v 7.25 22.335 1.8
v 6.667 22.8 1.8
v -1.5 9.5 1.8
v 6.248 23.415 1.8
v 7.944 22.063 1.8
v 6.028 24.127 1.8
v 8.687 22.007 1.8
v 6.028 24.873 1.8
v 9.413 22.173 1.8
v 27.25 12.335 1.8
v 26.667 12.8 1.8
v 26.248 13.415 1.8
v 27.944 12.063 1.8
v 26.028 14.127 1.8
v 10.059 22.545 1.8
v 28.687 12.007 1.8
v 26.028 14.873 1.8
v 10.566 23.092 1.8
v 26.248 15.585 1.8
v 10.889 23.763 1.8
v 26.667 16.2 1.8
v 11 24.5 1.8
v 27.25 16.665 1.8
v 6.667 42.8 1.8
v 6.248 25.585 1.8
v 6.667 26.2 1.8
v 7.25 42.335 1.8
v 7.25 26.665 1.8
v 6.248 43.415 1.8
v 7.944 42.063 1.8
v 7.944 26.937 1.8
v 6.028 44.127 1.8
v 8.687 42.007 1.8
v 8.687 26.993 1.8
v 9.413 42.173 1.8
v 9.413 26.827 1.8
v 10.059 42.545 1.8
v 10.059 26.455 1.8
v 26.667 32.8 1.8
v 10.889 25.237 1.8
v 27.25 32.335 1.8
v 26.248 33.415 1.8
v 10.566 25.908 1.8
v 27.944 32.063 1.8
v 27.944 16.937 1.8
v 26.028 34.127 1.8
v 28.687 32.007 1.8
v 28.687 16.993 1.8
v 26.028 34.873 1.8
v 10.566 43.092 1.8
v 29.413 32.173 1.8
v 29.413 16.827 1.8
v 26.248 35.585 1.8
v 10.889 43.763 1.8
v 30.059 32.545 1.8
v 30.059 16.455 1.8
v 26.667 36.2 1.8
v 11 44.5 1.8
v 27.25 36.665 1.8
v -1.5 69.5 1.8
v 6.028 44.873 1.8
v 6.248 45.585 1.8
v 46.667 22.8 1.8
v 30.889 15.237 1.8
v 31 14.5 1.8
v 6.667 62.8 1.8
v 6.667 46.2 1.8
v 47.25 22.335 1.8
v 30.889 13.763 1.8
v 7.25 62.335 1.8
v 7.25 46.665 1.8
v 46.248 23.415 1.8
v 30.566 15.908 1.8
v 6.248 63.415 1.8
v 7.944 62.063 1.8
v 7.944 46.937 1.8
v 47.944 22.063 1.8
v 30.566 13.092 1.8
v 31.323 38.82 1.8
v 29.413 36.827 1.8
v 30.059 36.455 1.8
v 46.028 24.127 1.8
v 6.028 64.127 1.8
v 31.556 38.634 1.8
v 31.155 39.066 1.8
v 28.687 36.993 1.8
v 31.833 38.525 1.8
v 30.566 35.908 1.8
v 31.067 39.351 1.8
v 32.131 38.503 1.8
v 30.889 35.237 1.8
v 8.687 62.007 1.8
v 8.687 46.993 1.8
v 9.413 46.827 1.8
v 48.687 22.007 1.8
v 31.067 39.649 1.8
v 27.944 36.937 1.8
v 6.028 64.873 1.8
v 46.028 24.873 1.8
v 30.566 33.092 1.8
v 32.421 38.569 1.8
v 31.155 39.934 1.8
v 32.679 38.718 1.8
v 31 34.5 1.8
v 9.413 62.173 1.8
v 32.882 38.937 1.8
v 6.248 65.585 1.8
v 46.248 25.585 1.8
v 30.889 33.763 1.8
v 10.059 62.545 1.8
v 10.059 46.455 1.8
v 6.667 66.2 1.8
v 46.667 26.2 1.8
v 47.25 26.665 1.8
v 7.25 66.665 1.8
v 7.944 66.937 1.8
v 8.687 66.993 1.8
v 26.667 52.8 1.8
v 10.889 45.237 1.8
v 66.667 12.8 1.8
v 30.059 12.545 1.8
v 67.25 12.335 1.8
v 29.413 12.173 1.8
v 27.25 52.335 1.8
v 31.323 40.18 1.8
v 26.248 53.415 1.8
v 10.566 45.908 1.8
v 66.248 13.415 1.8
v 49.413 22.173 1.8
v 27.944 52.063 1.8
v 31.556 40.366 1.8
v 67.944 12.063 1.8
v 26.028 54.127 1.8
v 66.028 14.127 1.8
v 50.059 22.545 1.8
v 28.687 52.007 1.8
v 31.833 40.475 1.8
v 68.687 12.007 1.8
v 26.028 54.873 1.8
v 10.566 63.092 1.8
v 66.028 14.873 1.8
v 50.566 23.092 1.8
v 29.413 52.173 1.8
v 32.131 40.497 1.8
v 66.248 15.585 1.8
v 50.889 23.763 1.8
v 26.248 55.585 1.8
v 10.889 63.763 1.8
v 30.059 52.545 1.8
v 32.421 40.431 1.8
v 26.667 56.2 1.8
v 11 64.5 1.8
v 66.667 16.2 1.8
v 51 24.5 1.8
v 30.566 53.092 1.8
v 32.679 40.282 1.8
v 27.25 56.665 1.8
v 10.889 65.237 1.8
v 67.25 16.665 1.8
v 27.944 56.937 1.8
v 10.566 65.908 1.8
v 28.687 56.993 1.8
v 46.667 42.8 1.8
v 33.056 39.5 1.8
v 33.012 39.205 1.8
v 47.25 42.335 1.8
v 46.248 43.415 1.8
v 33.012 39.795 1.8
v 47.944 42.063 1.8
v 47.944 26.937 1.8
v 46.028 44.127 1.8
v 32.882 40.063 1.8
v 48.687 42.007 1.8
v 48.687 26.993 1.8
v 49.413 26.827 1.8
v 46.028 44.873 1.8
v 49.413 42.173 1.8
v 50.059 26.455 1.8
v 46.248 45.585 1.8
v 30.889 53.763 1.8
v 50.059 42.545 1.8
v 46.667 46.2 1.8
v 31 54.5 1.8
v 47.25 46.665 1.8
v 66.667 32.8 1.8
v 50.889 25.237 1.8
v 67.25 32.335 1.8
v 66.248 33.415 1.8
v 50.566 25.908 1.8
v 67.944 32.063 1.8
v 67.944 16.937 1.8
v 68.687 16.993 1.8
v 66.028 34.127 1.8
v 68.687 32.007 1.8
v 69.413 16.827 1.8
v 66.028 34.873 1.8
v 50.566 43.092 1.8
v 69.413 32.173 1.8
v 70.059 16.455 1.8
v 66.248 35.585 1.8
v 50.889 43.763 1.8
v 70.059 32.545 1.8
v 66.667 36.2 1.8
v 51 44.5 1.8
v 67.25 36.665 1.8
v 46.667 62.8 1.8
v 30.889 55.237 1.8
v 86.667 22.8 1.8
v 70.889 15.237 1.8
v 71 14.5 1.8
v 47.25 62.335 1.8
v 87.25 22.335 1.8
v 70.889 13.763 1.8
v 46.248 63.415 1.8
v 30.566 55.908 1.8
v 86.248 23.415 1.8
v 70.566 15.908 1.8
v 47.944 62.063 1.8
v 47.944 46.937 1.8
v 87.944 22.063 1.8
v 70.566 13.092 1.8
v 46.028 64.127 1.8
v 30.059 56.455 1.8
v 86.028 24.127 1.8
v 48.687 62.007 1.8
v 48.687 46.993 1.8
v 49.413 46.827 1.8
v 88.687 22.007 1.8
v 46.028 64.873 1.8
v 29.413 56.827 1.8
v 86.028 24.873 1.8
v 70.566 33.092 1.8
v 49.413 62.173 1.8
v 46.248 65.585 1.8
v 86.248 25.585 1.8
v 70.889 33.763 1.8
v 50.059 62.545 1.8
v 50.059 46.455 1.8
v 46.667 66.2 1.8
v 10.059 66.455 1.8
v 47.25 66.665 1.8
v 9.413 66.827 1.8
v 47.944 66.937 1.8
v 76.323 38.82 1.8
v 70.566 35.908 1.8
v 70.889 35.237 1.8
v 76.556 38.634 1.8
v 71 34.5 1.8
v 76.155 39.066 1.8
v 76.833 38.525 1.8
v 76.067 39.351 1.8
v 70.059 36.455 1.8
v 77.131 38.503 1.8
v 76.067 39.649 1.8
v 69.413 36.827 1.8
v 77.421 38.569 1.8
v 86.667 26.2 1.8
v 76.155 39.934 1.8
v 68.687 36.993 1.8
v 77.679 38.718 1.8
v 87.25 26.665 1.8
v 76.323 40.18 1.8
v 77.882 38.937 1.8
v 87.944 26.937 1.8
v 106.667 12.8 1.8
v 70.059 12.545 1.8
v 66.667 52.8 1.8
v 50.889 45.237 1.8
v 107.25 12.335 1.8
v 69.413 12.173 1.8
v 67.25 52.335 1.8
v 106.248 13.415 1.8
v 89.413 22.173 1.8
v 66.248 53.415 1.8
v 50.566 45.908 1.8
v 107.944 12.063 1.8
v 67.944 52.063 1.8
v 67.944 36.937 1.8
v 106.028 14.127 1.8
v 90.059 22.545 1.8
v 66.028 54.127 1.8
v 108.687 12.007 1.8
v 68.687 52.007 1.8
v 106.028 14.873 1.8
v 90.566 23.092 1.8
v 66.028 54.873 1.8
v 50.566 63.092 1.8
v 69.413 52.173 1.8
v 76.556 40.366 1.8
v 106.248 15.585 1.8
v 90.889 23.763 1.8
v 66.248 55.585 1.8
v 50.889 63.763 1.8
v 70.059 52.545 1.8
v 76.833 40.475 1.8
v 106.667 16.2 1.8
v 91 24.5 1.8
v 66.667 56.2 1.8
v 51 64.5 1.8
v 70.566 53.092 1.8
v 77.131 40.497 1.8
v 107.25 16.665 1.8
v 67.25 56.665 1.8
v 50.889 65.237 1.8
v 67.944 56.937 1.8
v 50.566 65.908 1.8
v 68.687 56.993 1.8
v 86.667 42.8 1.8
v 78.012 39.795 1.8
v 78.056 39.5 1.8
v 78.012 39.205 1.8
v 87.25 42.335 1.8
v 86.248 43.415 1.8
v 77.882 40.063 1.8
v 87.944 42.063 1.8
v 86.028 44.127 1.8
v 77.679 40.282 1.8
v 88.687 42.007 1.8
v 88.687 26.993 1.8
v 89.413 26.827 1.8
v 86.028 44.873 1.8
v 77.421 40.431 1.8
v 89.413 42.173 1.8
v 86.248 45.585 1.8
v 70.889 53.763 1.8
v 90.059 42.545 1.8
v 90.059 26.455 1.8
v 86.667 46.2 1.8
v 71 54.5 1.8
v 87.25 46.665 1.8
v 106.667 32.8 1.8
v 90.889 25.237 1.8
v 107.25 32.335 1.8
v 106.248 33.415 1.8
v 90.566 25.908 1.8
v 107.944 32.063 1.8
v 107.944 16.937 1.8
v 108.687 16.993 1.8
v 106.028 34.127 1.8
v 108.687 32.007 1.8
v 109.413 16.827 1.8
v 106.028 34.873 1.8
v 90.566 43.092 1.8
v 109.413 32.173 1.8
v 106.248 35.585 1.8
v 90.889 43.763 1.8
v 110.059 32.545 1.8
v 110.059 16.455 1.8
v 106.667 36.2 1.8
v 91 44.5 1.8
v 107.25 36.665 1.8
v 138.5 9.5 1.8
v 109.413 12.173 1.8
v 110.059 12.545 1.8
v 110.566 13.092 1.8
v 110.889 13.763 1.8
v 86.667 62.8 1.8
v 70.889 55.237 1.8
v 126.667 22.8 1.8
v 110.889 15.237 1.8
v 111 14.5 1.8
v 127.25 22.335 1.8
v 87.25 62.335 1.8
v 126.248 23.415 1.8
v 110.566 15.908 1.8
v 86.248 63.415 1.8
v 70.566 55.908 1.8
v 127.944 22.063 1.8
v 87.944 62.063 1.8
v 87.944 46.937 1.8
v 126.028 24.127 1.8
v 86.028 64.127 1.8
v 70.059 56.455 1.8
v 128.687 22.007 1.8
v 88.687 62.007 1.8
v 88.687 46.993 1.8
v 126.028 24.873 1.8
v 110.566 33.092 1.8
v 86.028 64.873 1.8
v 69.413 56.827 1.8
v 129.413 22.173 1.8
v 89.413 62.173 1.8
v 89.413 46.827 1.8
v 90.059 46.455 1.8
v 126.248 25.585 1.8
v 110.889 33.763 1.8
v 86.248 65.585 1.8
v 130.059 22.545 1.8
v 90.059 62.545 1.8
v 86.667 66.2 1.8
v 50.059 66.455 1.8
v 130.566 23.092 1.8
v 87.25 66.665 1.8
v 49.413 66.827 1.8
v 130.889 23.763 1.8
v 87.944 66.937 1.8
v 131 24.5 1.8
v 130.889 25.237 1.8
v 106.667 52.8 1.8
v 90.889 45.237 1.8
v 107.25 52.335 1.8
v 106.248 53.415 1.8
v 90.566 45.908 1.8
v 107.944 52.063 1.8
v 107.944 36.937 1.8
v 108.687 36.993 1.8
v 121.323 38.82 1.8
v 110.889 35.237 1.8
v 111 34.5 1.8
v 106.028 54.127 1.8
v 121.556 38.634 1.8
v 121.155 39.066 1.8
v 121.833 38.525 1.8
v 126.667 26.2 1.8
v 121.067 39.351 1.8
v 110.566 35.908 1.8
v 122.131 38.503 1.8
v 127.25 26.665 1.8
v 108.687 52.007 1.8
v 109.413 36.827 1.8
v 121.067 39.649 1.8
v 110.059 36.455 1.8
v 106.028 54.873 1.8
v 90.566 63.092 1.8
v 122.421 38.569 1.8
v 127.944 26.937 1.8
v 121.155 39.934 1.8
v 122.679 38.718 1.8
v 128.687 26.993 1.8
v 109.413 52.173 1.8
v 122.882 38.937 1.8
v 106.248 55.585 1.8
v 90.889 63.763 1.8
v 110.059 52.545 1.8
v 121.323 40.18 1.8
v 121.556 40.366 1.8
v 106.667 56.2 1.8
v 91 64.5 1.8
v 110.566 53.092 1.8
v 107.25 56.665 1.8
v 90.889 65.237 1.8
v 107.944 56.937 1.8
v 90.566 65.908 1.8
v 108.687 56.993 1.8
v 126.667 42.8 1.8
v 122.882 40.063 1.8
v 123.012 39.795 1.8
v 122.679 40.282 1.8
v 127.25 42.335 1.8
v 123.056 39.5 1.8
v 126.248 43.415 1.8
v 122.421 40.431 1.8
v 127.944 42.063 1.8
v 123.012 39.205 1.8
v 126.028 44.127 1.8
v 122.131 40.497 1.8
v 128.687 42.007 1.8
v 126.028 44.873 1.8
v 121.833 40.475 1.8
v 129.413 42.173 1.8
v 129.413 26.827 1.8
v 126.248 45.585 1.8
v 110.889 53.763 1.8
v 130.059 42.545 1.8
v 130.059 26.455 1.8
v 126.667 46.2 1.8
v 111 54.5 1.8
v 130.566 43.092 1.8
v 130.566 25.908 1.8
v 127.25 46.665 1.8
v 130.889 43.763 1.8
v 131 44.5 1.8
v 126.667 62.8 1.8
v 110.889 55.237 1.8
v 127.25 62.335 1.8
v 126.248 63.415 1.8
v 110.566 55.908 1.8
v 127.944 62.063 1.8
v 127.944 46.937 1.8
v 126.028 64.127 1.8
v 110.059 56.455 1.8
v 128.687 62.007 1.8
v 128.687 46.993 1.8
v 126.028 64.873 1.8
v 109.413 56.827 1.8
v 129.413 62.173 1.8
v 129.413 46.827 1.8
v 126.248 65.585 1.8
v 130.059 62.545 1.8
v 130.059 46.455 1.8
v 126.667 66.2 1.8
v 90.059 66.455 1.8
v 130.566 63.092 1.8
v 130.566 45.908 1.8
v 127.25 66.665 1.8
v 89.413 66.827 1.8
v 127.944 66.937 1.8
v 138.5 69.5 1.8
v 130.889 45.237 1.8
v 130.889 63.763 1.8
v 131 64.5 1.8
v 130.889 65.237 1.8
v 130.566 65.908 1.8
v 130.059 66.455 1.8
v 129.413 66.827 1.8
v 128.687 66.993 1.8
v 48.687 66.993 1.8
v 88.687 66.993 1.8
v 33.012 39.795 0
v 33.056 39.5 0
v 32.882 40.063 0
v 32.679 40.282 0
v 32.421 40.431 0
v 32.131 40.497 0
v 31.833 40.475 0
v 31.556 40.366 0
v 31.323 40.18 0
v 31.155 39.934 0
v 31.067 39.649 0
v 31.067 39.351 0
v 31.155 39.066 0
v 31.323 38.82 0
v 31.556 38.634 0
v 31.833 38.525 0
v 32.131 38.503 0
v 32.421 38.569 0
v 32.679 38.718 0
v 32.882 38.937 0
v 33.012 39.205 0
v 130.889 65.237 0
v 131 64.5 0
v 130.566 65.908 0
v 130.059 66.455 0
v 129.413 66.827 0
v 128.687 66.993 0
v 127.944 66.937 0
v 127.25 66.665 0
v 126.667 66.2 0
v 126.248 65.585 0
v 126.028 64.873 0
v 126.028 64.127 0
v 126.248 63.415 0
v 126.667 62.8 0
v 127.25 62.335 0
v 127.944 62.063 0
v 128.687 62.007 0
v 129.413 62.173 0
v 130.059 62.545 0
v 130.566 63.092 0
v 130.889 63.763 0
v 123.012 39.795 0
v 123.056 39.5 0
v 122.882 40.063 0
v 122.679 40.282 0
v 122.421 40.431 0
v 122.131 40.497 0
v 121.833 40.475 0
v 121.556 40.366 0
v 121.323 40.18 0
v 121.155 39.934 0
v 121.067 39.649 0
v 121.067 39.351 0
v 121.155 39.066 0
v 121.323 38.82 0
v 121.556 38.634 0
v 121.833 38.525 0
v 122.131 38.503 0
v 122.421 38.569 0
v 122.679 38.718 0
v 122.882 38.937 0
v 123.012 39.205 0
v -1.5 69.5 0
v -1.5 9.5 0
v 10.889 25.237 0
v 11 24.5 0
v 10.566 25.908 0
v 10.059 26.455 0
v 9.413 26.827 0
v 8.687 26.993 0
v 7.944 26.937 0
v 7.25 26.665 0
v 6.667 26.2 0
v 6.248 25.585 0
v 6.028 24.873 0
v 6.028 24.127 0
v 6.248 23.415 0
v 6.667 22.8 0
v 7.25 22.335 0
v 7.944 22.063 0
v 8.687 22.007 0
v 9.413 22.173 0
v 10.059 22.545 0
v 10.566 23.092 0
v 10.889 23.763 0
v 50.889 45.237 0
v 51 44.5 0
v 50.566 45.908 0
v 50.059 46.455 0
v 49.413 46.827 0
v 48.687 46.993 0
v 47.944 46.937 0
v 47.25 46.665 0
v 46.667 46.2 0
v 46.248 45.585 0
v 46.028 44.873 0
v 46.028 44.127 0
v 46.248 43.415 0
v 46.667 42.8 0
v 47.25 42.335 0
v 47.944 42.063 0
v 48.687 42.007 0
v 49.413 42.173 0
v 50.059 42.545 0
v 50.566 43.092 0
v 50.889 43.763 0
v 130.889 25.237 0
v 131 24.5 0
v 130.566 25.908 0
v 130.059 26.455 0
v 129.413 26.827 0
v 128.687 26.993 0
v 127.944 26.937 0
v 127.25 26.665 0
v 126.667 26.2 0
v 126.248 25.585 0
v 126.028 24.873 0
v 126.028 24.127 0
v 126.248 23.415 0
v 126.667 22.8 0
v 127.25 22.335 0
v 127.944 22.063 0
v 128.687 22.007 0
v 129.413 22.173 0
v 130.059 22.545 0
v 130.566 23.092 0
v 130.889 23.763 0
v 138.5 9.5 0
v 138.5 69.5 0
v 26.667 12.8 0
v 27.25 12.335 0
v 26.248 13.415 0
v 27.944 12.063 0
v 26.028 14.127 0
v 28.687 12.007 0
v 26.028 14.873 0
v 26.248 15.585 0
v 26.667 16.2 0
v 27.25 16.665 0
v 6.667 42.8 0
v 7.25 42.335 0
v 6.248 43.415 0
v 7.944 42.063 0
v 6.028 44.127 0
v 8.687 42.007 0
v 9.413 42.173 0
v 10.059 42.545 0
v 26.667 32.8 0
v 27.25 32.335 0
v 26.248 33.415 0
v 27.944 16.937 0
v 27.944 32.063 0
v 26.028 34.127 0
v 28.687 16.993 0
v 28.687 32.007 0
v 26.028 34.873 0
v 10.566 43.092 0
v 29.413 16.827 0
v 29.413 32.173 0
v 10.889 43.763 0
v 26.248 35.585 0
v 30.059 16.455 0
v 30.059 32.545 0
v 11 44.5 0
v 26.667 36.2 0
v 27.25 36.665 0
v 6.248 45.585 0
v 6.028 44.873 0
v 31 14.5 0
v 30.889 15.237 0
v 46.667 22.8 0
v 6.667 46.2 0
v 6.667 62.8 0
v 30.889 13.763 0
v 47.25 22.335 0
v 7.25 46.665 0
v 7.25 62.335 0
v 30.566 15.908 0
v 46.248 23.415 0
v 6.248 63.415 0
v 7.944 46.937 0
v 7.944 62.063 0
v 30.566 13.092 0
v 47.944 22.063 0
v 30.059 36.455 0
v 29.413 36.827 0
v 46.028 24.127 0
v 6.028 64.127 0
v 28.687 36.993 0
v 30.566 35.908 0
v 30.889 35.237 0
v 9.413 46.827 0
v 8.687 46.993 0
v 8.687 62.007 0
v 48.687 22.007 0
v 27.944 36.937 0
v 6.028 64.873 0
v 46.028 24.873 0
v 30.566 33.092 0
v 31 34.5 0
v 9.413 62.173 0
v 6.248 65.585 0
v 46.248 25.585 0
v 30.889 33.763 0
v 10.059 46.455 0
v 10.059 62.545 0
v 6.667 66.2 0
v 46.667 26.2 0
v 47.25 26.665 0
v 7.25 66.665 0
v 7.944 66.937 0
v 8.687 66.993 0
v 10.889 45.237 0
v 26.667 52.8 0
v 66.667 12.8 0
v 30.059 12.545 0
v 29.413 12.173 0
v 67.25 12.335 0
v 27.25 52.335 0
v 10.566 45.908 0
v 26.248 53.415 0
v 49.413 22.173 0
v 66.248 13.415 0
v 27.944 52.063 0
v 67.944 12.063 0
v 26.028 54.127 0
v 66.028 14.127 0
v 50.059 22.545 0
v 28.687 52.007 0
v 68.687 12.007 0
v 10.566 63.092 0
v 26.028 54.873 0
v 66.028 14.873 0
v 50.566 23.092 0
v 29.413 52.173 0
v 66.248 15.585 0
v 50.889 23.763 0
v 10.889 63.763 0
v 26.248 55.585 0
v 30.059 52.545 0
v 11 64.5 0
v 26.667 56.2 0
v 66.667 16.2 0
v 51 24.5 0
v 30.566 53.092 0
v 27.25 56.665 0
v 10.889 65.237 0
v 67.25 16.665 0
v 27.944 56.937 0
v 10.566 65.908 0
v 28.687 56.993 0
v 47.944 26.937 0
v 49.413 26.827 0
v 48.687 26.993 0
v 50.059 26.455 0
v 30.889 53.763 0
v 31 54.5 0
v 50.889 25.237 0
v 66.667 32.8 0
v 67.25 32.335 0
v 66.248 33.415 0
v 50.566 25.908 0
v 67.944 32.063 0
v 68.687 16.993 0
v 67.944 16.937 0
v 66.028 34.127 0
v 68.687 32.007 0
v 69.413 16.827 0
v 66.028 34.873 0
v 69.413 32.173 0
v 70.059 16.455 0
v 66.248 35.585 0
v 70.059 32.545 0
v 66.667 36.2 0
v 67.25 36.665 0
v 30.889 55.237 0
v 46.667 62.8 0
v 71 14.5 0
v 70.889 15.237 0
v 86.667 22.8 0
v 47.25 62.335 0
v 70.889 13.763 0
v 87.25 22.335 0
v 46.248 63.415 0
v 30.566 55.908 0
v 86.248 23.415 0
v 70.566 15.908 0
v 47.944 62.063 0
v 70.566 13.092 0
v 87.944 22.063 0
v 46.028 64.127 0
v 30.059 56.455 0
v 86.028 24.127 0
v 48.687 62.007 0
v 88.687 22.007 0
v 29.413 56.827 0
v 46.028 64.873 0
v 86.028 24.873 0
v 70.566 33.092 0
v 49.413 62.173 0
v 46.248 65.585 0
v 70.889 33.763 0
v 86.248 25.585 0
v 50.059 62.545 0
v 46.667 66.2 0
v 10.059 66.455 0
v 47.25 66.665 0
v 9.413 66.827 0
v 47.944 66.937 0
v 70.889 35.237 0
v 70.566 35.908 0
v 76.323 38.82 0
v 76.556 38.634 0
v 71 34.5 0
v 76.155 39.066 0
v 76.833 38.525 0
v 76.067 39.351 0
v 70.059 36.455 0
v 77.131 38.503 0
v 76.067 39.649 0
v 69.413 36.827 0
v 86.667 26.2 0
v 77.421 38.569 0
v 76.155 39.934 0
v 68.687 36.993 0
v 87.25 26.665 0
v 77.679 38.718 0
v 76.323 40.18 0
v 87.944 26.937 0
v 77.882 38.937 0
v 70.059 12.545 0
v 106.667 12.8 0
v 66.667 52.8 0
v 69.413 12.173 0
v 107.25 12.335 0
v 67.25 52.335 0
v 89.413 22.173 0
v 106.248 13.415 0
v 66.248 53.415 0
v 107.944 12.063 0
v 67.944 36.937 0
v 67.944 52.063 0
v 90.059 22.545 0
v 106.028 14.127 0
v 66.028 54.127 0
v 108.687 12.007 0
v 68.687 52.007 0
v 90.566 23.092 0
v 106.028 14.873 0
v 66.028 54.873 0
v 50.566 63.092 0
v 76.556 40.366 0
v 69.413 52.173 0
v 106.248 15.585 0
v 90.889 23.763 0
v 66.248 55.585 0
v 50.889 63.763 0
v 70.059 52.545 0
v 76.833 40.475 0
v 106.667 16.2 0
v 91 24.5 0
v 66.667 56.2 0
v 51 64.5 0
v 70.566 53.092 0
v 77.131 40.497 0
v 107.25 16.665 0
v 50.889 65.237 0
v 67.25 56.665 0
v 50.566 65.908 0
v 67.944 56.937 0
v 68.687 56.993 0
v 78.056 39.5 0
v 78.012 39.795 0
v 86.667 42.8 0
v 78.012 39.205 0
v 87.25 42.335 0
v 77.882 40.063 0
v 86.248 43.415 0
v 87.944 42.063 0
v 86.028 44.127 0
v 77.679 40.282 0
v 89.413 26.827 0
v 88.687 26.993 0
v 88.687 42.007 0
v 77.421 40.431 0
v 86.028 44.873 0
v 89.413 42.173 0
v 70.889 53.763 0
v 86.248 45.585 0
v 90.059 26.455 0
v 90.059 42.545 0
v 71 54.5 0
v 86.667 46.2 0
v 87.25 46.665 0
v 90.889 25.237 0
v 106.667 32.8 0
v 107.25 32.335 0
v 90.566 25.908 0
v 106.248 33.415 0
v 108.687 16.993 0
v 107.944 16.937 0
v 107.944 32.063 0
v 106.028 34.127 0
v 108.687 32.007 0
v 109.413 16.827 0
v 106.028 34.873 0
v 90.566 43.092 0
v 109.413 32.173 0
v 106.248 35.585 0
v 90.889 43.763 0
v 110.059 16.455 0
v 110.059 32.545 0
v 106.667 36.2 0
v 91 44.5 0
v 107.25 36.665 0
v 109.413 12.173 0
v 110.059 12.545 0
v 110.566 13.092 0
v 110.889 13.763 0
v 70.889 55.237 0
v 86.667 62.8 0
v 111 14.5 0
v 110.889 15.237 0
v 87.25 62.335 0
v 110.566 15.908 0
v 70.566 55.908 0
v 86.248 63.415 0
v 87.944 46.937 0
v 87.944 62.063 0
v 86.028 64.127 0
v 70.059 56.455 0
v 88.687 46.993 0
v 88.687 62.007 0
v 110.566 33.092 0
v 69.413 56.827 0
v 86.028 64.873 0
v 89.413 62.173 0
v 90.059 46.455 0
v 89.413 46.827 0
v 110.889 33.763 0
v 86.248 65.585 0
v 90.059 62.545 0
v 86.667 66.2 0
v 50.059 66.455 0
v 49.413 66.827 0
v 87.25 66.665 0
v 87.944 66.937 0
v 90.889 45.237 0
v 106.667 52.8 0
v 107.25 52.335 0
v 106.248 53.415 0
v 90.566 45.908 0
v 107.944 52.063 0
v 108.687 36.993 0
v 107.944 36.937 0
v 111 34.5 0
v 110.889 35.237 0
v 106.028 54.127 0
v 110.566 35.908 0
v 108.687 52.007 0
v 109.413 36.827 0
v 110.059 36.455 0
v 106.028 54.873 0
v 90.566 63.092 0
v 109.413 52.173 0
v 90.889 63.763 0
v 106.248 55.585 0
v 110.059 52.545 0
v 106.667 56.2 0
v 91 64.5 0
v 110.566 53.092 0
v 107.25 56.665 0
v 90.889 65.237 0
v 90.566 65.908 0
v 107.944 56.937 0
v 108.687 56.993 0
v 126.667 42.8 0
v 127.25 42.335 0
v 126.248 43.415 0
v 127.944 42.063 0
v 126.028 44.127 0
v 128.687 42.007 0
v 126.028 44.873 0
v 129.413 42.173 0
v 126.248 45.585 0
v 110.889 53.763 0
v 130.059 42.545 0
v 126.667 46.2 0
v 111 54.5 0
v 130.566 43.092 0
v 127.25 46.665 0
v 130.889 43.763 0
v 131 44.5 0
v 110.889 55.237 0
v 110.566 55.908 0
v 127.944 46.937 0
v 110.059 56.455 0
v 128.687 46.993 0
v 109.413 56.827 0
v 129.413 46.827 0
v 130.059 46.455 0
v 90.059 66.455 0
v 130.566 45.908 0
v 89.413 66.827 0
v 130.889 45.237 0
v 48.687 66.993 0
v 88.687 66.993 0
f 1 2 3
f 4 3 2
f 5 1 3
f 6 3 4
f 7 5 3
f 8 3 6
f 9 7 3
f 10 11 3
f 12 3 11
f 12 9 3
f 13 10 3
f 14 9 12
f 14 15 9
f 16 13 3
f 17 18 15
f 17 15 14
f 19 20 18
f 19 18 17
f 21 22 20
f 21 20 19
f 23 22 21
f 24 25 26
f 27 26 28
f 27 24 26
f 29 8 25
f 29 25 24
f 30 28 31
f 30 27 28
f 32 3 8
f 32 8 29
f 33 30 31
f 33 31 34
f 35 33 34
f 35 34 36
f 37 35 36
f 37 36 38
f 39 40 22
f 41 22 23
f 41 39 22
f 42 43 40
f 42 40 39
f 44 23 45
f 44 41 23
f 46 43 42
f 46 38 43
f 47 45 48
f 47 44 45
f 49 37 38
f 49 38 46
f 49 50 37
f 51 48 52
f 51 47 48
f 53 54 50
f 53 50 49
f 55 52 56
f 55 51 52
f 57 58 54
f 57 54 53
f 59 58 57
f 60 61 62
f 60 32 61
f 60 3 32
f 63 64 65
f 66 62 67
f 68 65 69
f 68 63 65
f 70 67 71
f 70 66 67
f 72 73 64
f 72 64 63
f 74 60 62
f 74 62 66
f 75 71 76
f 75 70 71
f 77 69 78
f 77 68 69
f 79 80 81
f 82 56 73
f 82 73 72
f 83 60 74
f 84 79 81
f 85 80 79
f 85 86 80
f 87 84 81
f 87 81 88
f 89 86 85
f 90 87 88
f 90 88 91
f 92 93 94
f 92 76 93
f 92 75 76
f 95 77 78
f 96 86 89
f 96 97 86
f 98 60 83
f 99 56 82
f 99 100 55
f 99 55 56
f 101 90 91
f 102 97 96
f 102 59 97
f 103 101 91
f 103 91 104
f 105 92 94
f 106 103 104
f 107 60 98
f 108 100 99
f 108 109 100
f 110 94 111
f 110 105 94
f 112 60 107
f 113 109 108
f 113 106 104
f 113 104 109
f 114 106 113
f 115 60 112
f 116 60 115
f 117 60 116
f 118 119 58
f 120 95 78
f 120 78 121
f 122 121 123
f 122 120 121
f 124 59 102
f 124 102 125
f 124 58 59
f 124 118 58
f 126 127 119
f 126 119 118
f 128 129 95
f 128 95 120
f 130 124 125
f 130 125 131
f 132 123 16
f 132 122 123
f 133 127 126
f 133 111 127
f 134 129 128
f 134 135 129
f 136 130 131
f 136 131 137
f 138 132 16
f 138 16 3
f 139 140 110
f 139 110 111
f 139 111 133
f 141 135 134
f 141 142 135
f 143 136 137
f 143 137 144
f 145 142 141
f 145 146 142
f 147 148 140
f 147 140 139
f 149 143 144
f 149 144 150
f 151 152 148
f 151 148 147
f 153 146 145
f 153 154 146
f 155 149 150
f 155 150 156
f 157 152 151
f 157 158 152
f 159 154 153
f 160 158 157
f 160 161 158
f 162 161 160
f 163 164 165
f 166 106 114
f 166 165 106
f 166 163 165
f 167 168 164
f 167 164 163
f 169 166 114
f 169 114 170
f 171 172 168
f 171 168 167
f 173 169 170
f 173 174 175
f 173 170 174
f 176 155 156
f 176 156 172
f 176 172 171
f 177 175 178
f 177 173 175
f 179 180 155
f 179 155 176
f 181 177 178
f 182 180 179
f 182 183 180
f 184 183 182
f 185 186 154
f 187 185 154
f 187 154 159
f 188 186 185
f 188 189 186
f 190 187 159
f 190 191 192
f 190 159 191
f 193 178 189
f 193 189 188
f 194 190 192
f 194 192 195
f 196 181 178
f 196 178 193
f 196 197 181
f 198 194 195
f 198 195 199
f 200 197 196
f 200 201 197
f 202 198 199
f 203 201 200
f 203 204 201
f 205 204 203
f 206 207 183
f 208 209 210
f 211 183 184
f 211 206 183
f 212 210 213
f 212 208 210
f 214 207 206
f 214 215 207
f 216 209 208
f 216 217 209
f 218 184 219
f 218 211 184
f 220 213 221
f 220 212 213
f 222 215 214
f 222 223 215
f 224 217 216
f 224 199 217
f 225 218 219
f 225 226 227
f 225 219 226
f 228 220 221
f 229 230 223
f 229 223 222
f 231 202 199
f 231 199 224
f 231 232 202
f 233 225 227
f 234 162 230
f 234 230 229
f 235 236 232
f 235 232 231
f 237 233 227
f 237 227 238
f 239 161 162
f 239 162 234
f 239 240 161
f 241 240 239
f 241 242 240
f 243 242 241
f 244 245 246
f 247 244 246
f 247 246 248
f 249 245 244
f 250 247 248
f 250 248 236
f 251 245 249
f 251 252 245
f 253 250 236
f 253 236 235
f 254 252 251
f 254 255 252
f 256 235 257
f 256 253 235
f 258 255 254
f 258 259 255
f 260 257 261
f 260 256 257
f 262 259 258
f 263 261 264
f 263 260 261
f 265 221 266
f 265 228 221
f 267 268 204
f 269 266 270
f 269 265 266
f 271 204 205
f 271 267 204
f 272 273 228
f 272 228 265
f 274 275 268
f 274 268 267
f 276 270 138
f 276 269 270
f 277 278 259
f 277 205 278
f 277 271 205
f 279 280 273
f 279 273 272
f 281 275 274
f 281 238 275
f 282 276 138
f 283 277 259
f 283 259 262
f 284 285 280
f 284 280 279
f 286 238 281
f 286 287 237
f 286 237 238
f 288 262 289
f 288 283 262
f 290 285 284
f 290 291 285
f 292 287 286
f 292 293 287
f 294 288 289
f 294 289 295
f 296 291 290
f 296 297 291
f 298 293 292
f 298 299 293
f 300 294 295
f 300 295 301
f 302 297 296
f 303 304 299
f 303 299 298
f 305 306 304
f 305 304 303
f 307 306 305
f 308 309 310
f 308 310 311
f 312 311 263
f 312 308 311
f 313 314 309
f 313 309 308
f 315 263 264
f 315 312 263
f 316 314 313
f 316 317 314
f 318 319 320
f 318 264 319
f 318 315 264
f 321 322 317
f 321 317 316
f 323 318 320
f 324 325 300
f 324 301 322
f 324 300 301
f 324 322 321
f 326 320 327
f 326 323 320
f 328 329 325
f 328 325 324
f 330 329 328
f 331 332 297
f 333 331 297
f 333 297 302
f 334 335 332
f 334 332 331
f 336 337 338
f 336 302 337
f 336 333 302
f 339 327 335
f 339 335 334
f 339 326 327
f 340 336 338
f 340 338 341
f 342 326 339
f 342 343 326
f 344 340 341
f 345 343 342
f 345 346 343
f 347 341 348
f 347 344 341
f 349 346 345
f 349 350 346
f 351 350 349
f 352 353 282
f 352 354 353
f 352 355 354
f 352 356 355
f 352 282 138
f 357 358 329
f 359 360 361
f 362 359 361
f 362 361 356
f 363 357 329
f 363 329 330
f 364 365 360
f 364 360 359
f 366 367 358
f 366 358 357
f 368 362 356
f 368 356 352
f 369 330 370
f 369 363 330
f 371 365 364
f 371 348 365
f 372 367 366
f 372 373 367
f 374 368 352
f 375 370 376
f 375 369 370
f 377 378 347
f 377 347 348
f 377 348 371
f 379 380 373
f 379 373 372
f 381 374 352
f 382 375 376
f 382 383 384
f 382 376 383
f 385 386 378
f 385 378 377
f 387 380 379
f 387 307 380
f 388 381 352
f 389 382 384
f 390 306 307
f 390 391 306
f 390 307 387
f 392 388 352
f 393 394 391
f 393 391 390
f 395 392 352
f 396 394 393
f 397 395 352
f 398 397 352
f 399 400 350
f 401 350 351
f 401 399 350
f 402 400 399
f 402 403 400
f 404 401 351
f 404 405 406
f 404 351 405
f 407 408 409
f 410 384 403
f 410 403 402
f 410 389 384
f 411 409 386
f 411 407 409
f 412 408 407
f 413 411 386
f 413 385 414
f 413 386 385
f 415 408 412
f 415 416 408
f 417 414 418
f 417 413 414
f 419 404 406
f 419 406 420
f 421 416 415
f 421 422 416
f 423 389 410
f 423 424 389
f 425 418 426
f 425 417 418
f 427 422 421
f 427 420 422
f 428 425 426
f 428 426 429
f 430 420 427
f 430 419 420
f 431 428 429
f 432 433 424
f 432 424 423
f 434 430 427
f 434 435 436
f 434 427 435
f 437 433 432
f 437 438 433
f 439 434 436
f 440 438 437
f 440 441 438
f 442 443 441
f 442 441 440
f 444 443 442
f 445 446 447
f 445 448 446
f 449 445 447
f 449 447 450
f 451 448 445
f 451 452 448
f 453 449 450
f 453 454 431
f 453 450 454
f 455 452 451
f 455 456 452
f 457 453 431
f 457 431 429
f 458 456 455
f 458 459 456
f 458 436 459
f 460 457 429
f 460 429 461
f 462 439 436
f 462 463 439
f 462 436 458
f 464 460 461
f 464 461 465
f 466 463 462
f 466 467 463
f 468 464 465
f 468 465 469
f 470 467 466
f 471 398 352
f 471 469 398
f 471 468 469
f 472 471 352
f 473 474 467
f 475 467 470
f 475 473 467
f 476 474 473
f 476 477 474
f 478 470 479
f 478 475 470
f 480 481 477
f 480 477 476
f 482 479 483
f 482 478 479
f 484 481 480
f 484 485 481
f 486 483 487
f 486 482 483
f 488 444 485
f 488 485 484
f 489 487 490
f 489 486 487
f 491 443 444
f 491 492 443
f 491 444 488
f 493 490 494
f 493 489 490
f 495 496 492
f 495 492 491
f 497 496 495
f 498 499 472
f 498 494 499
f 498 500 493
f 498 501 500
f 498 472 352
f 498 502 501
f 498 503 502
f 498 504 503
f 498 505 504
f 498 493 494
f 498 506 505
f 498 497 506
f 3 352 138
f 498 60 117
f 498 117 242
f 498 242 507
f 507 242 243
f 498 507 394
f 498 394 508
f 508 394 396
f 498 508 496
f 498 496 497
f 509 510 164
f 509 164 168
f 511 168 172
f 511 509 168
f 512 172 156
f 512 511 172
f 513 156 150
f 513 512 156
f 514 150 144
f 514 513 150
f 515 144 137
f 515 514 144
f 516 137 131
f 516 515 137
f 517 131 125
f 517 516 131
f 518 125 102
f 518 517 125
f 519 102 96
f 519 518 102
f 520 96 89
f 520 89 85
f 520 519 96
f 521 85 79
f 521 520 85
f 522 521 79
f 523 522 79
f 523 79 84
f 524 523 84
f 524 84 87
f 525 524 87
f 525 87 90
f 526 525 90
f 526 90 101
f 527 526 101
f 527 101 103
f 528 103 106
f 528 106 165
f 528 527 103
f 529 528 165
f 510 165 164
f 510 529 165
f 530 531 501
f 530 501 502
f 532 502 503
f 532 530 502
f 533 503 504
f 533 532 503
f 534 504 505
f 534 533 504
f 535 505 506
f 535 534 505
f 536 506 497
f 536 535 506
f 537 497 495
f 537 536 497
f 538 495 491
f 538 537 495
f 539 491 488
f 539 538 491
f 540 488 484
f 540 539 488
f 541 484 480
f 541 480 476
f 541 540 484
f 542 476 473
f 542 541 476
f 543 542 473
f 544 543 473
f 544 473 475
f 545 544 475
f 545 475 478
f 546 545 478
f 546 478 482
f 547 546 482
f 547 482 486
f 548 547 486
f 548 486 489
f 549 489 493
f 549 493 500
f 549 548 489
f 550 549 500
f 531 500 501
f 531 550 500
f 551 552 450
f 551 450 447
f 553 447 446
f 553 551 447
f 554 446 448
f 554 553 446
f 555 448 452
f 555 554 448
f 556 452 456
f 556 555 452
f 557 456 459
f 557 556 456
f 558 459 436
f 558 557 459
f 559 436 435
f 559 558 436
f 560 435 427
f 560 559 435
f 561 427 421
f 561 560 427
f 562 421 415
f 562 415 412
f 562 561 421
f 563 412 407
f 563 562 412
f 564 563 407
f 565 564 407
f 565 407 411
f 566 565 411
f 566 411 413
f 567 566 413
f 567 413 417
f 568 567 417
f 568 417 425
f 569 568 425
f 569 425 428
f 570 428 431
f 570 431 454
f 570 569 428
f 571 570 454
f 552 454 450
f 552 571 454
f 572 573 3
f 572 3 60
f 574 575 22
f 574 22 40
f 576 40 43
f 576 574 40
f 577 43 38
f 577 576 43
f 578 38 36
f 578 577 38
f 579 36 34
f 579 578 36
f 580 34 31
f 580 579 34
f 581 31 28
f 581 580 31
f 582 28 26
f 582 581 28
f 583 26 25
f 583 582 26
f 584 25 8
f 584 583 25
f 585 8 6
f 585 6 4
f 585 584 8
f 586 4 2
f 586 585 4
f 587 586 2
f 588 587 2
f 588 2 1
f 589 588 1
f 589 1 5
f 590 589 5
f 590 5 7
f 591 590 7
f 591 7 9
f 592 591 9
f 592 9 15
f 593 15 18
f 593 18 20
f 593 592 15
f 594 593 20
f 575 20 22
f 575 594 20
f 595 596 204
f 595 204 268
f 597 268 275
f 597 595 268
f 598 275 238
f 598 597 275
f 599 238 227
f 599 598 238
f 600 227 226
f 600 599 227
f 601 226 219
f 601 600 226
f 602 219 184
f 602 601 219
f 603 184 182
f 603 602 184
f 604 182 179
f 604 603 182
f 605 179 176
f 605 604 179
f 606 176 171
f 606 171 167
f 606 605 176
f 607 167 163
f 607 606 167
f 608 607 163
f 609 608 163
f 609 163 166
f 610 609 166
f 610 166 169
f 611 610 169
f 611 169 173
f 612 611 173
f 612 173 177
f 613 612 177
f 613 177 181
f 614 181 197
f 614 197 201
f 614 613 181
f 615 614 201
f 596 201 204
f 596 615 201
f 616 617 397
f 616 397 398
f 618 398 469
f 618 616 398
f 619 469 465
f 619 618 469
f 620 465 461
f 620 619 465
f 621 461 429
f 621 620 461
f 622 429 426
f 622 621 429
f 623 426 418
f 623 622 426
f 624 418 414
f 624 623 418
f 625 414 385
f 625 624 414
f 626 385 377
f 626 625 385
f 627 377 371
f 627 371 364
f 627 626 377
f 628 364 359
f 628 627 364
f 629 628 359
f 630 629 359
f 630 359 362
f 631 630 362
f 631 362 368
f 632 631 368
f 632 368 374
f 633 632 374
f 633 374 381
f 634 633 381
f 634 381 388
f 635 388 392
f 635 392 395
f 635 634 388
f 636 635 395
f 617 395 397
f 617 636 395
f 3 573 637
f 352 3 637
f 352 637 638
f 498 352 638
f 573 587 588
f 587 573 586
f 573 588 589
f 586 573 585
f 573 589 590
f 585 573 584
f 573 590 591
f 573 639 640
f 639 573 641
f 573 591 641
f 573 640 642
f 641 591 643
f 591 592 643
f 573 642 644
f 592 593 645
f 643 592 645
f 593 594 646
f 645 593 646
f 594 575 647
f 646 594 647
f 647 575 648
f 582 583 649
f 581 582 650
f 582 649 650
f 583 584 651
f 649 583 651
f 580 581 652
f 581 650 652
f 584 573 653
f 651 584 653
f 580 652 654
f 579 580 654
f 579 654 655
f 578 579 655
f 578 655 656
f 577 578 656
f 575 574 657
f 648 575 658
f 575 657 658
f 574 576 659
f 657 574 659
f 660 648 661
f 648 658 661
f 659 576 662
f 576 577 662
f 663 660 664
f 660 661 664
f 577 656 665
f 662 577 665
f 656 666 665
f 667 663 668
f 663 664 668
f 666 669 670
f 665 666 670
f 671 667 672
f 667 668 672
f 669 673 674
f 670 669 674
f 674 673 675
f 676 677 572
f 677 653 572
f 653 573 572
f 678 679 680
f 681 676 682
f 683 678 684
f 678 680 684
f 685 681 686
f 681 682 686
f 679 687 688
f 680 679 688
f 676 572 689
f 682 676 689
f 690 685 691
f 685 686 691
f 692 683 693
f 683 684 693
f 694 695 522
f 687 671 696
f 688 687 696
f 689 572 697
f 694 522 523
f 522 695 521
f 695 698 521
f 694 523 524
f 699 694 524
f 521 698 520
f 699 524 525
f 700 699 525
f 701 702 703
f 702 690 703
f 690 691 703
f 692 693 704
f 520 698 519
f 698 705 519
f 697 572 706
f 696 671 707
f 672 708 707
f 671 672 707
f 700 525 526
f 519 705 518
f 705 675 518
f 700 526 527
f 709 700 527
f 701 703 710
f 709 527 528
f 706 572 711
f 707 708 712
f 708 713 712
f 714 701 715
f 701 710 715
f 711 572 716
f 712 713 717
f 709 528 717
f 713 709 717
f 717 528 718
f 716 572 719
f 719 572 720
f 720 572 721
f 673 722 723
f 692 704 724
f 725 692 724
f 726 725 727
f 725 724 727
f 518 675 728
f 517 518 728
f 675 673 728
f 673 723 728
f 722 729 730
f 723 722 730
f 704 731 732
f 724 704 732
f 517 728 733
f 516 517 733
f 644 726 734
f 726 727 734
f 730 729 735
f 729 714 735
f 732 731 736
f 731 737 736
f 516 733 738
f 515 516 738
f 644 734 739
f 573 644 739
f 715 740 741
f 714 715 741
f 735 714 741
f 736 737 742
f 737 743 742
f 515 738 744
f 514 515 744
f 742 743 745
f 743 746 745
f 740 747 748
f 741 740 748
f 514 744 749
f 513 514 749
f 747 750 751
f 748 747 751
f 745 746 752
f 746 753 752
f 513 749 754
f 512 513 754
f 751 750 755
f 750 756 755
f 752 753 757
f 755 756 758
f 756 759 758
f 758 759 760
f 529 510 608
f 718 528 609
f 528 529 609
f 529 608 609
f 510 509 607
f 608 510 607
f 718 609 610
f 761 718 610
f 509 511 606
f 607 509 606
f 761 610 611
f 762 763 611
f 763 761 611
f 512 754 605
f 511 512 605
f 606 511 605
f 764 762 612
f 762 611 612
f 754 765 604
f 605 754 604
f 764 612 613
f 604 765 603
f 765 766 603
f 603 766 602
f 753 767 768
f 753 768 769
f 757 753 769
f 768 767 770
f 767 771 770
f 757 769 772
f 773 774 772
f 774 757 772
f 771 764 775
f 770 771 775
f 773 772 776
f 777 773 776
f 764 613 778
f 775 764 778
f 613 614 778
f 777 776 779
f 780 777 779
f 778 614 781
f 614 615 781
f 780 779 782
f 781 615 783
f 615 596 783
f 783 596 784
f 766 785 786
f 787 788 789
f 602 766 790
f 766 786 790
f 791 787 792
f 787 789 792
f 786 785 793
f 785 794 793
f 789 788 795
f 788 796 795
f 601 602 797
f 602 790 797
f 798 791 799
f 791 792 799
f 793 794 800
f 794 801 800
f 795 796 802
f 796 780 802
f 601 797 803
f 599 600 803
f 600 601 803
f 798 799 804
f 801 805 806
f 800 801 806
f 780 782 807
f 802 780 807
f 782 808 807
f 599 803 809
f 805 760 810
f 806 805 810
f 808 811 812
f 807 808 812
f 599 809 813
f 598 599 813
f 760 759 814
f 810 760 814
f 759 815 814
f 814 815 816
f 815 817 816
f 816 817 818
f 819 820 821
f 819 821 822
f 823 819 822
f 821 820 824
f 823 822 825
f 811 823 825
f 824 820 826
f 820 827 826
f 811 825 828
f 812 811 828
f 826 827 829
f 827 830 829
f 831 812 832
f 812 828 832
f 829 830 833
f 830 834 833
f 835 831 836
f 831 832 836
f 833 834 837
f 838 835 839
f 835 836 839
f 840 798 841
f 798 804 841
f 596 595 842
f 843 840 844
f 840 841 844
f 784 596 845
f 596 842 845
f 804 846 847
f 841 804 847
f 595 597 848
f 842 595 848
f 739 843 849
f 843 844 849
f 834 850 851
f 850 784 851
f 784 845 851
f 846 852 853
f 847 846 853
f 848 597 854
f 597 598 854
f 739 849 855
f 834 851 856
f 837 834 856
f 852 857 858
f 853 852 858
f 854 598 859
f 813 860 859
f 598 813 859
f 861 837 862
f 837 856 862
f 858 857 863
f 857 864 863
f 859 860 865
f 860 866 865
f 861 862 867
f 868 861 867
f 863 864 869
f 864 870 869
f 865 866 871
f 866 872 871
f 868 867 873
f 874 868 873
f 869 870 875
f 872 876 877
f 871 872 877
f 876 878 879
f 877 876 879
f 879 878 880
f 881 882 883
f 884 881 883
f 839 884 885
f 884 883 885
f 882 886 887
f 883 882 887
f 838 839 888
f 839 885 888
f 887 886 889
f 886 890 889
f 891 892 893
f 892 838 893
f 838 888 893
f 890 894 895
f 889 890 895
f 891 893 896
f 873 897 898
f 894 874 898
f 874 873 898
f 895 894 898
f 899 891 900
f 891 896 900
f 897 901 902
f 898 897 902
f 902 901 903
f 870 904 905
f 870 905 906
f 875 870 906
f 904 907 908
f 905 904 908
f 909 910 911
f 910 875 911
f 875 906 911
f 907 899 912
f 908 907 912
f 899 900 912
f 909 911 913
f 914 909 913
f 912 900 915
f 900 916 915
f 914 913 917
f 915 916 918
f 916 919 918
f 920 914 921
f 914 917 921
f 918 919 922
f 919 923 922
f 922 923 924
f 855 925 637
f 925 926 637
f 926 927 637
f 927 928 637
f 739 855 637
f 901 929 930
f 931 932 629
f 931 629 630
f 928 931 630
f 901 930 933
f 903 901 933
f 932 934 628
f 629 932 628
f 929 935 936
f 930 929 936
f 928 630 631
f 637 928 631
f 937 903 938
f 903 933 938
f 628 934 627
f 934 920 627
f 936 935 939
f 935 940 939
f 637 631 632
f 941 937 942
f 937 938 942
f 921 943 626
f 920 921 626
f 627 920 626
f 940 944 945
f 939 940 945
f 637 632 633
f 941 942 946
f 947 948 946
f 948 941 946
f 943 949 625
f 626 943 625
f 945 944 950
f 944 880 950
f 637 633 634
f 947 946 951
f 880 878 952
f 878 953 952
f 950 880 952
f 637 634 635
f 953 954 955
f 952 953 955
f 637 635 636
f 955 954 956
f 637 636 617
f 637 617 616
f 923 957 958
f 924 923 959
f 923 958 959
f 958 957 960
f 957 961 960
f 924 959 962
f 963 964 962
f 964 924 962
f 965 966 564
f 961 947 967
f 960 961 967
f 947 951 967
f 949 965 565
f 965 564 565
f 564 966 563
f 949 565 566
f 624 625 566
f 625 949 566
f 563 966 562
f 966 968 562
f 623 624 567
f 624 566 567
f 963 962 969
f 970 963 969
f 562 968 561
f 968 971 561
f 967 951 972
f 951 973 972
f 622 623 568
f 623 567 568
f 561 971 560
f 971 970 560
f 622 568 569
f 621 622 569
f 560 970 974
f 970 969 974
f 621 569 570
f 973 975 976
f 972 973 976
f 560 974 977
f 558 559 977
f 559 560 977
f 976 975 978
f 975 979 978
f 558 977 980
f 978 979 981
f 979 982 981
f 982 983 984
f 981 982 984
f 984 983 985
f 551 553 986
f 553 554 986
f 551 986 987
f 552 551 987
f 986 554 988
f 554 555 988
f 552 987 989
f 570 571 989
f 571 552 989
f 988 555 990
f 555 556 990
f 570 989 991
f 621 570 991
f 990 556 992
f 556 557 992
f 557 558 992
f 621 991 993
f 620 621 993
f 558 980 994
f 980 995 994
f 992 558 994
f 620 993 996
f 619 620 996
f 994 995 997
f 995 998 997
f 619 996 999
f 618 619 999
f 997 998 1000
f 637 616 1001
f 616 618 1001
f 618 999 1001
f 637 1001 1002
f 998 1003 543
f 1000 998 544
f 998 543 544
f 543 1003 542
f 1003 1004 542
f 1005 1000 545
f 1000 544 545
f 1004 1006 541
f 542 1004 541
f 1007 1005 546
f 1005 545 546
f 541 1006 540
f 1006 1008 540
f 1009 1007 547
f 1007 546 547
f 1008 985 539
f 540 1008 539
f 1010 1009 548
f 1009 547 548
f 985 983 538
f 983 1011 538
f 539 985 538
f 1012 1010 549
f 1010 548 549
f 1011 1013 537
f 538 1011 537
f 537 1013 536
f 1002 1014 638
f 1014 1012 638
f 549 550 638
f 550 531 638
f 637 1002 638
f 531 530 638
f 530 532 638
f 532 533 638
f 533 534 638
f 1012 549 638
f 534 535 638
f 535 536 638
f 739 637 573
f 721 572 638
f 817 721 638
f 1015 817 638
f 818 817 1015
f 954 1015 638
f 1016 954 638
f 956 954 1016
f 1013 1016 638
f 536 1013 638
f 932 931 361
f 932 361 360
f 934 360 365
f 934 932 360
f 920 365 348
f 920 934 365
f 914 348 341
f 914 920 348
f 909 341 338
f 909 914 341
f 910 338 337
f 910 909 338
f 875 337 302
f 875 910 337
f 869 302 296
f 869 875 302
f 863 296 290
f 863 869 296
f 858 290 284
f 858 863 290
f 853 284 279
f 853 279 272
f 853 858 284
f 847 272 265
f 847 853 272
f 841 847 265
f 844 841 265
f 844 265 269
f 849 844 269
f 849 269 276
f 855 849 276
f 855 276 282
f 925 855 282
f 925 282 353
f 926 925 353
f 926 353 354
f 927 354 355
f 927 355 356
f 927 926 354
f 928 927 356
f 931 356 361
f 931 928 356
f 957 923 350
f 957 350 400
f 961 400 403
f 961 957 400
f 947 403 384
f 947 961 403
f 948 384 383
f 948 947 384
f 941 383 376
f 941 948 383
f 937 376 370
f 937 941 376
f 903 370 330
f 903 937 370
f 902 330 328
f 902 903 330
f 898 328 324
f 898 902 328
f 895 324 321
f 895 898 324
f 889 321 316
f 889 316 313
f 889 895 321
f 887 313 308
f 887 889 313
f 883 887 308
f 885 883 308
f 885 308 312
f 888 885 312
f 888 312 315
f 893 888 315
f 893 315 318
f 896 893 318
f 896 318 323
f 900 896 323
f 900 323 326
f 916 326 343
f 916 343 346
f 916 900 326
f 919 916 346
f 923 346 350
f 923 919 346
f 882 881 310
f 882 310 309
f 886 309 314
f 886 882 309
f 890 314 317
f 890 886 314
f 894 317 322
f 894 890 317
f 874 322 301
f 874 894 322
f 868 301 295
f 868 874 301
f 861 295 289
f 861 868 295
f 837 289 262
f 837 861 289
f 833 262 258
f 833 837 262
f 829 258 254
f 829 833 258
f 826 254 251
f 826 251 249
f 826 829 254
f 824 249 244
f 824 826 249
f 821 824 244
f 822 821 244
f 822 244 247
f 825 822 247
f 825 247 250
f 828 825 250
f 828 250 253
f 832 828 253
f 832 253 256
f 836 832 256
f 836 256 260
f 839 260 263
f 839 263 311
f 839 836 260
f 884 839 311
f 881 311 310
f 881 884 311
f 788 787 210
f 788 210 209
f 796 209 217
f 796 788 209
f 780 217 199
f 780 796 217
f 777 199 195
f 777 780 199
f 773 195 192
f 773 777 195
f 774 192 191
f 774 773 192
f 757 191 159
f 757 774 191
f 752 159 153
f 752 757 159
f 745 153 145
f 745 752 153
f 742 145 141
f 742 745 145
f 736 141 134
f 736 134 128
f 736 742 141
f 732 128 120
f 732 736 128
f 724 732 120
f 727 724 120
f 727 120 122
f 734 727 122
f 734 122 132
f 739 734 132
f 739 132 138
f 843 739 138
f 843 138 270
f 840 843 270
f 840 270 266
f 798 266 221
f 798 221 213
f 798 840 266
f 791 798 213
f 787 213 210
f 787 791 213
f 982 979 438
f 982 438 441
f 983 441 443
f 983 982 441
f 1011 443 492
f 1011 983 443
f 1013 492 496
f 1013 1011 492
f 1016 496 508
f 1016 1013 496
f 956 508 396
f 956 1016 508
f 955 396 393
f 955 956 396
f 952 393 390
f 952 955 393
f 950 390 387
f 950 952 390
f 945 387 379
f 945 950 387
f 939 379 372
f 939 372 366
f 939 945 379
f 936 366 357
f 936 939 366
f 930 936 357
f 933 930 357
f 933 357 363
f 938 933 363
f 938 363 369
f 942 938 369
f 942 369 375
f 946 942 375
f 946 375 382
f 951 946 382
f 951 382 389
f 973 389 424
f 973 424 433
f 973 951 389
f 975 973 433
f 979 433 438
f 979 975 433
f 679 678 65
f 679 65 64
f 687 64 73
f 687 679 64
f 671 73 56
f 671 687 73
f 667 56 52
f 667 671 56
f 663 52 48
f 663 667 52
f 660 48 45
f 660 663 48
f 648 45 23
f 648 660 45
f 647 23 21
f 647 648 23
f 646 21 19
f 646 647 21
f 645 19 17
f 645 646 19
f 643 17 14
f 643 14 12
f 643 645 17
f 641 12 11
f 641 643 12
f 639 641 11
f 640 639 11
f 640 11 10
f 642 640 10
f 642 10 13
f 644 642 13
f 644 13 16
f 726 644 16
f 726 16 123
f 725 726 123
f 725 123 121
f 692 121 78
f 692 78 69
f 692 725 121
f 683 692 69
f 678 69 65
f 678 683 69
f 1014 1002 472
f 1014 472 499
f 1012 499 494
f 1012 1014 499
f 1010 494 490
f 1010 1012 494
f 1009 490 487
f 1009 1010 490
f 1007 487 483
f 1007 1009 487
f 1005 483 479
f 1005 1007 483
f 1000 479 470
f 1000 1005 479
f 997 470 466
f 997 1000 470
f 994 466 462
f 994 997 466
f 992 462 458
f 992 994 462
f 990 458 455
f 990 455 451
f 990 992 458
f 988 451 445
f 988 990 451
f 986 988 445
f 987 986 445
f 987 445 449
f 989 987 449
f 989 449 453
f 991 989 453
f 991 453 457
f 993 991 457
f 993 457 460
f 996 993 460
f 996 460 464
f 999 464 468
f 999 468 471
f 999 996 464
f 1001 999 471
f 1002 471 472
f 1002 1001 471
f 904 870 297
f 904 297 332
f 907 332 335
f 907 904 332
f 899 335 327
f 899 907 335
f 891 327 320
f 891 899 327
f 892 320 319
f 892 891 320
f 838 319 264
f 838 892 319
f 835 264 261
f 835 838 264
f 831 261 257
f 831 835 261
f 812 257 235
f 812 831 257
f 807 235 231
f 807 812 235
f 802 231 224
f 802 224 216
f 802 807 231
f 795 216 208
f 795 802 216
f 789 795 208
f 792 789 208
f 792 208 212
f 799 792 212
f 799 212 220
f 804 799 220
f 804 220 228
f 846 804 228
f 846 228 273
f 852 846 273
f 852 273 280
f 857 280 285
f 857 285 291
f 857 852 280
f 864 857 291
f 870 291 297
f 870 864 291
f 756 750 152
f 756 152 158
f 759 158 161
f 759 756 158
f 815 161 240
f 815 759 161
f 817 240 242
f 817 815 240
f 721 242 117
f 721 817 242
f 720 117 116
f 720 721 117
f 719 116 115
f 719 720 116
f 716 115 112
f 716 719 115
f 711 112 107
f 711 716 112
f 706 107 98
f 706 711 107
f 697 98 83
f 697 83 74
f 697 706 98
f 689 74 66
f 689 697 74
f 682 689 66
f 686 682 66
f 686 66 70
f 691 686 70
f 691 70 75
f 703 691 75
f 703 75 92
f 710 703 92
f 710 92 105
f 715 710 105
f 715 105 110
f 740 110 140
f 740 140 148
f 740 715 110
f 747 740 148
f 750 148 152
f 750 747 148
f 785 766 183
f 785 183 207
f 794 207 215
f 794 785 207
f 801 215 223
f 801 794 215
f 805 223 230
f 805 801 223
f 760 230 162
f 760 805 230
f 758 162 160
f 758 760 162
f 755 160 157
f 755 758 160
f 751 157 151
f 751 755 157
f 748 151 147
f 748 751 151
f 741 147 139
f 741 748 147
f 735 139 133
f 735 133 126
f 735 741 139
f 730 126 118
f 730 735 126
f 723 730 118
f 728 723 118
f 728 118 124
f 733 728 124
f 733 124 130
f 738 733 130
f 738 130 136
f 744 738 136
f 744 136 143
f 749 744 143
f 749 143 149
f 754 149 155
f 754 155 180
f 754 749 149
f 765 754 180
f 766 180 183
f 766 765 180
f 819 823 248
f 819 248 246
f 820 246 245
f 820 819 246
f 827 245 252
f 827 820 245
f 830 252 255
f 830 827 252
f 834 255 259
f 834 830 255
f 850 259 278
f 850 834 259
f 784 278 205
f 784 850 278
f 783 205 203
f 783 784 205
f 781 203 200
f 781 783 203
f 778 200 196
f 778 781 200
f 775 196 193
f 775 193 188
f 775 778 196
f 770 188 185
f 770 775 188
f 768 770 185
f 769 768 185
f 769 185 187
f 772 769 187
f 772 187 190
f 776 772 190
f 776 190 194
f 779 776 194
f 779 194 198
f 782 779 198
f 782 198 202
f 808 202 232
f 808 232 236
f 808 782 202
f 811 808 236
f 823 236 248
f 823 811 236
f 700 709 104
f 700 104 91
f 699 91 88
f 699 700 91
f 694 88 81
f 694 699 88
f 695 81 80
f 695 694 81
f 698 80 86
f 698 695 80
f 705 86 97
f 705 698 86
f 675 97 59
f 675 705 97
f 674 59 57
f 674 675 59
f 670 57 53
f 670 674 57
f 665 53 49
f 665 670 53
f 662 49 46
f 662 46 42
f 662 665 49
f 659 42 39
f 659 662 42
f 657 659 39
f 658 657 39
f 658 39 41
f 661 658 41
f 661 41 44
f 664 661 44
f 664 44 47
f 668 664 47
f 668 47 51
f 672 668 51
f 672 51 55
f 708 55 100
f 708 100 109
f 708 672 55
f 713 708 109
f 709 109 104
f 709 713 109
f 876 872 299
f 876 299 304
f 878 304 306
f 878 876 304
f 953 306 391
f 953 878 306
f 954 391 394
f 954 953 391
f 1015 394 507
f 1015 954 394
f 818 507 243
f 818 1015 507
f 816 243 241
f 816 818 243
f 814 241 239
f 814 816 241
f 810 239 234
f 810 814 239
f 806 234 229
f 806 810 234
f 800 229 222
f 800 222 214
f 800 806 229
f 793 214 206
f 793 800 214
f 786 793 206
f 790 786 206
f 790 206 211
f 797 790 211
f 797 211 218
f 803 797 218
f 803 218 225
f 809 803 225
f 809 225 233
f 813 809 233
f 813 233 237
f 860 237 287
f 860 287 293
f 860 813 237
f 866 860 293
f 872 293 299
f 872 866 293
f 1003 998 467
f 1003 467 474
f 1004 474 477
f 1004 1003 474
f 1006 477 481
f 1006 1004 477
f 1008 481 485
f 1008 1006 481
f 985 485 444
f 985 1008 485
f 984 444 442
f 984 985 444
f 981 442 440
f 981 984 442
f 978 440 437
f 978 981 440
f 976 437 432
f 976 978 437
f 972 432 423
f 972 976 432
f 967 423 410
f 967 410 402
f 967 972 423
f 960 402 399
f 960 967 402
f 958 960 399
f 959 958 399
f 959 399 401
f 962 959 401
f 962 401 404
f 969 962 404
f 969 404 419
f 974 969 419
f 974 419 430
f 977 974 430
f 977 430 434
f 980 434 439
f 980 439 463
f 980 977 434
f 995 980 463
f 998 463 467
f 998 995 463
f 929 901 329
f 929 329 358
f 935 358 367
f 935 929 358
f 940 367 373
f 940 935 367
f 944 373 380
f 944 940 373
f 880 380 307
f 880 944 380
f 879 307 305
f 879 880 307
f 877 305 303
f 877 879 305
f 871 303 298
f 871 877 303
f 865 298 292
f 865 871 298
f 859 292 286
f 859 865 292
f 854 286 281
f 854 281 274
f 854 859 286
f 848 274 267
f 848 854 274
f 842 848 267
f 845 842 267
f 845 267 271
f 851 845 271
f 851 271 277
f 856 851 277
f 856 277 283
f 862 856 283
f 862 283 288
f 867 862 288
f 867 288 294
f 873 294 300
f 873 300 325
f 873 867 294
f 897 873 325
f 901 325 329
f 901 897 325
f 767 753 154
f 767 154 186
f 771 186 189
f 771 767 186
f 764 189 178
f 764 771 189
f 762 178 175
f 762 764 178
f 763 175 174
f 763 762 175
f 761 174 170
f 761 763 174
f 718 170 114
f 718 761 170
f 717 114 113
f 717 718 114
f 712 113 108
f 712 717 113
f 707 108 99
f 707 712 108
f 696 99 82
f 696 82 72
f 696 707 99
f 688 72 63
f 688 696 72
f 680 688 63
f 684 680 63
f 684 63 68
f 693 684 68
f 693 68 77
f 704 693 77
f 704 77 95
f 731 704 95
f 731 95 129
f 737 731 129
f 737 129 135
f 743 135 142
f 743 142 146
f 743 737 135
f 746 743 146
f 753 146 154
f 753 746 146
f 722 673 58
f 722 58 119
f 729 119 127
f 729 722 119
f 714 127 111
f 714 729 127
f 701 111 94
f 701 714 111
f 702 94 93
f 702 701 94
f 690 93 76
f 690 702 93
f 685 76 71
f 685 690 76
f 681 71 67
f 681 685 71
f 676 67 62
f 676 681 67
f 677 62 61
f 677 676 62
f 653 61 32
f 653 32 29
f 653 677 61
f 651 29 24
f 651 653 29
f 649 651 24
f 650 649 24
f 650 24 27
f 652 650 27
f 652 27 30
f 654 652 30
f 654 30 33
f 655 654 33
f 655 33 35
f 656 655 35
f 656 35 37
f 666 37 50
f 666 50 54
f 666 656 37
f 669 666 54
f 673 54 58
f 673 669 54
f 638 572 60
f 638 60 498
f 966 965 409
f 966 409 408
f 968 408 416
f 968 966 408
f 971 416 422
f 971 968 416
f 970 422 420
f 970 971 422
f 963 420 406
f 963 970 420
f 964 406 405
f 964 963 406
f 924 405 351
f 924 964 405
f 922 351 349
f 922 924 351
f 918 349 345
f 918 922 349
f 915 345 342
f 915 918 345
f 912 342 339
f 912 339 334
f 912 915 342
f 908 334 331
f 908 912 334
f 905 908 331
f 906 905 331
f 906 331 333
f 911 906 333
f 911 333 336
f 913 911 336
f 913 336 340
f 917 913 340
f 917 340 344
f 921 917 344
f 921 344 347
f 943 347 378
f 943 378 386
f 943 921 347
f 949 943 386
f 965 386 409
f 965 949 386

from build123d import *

# Parameters (mm, degrees)
SKETCH_W   = 140
SKETCH_H   = 60
SKETCH_R   = 2.5
SKETCH_R_2 = 1
PAD_DEPTH  = 1.8


with BuildPart() as part:
    # Sketch → Pad (new body)
    with BuildSketch(Plane.XY):
        with Locations((68.5, 39.5)):
            Rectangle(SKETCH_W, SKETCH_H)
        with Locations((28.5, 14.5)):
            Circle(SKETCH_R, mode=Mode.SUBTRACT)
        with Locations((108.5, 14.5)):
            Circle(SKETCH_R, mode=Mode.SUBTRACT)
        with Locations((8.5, 24.5)):
            Circle(SKETCH_R, mode=Mode.SUBTRACT)
        with Locations((48.5, 24.5)):
            Circle(SKETCH_R, mode=Mode.SUBTRACT)
        with Locations((88.5, 24.5)):
            Circle(SKETCH_R, mode=Mode.SUBTRACT)
        with Locations((8.5, 44.5)):
            Circle(SKETCH_R, mode=Mode.SUBTRACT)
        with Locations((48.5, 44.5)):
            Circle(SKETCH_R, mode=Mode.SUBTRACT)
        with Locations((88.5, 44.5)):
            Circle(SKETCH_R, mode=Mode.SUBTRACT)
        with Locations((28.5, 54.5)):
            Circle(SKETCH_R, mode=Mode.SUBTRACT)
        with Locations((68.5, 54.5)):
            Circle(SKETCH_R, mode=Mode.SUBTRACT)
        with Locations((108.5, 54.5)):
            Circle(SKETCH_R, mode=Mode.SUBTRACT)
        with Locations((88.5, 64.5)):
            Circle(SKETCH_R, mode=Mode.SUBTRACT)
        with Locations((48.5, 64.5)):
            Circle(SKETCH_R, mode=Mode.SUBTRACT)
        with Locations((8.5, 64.5)):
            Circle(SKETCH_R, mode=Mode.SUBTRACT)
        with Locations((28.5, 34.5)):
            Circle(SKETCH_R, mode=Mode.SUBTRACT)
        with Locations((68.5, 34.5)):
            Circle(SKETCH_R, mode=Mode.SUBTRACT)
        with Locations((108.5, 34.5)):
            Circle(SKETCH_R, mode=Mode.SUBTRACT)
        with Locations((68.5, 14.5)):
            Circle(SKETCH_R, mode=Mode.SUBTRACT)
        with Locations((128.5, 24.5)):
            Circle(SKETCH_R, mode=Mode.SUBTRACT)
        with Locations((128.5, 44.5)):
            Circle(SKETCH_R, mode=Mode.SUBTRACT)
        with Locations((128.5, 64.5)):
            Circle(SKETCH_R, mode=Mode.SUBTRACT)
        with Locations((77.055992, 39.5)):
            Circle(SKETCH_R_2, mode=Mode.SUBTRACT)
        with Locations((122.055992, 39.5)):
            Circle(SKETCH_R_2, mode=Mode.SUBTRACT)
        with Locations((32.055992, 39.5)):
            Circle(SKETCH_R_2, mode=Mode.SUBTRACT)
    extrude(amount=PAD_DEPTH)


solid = part.part
